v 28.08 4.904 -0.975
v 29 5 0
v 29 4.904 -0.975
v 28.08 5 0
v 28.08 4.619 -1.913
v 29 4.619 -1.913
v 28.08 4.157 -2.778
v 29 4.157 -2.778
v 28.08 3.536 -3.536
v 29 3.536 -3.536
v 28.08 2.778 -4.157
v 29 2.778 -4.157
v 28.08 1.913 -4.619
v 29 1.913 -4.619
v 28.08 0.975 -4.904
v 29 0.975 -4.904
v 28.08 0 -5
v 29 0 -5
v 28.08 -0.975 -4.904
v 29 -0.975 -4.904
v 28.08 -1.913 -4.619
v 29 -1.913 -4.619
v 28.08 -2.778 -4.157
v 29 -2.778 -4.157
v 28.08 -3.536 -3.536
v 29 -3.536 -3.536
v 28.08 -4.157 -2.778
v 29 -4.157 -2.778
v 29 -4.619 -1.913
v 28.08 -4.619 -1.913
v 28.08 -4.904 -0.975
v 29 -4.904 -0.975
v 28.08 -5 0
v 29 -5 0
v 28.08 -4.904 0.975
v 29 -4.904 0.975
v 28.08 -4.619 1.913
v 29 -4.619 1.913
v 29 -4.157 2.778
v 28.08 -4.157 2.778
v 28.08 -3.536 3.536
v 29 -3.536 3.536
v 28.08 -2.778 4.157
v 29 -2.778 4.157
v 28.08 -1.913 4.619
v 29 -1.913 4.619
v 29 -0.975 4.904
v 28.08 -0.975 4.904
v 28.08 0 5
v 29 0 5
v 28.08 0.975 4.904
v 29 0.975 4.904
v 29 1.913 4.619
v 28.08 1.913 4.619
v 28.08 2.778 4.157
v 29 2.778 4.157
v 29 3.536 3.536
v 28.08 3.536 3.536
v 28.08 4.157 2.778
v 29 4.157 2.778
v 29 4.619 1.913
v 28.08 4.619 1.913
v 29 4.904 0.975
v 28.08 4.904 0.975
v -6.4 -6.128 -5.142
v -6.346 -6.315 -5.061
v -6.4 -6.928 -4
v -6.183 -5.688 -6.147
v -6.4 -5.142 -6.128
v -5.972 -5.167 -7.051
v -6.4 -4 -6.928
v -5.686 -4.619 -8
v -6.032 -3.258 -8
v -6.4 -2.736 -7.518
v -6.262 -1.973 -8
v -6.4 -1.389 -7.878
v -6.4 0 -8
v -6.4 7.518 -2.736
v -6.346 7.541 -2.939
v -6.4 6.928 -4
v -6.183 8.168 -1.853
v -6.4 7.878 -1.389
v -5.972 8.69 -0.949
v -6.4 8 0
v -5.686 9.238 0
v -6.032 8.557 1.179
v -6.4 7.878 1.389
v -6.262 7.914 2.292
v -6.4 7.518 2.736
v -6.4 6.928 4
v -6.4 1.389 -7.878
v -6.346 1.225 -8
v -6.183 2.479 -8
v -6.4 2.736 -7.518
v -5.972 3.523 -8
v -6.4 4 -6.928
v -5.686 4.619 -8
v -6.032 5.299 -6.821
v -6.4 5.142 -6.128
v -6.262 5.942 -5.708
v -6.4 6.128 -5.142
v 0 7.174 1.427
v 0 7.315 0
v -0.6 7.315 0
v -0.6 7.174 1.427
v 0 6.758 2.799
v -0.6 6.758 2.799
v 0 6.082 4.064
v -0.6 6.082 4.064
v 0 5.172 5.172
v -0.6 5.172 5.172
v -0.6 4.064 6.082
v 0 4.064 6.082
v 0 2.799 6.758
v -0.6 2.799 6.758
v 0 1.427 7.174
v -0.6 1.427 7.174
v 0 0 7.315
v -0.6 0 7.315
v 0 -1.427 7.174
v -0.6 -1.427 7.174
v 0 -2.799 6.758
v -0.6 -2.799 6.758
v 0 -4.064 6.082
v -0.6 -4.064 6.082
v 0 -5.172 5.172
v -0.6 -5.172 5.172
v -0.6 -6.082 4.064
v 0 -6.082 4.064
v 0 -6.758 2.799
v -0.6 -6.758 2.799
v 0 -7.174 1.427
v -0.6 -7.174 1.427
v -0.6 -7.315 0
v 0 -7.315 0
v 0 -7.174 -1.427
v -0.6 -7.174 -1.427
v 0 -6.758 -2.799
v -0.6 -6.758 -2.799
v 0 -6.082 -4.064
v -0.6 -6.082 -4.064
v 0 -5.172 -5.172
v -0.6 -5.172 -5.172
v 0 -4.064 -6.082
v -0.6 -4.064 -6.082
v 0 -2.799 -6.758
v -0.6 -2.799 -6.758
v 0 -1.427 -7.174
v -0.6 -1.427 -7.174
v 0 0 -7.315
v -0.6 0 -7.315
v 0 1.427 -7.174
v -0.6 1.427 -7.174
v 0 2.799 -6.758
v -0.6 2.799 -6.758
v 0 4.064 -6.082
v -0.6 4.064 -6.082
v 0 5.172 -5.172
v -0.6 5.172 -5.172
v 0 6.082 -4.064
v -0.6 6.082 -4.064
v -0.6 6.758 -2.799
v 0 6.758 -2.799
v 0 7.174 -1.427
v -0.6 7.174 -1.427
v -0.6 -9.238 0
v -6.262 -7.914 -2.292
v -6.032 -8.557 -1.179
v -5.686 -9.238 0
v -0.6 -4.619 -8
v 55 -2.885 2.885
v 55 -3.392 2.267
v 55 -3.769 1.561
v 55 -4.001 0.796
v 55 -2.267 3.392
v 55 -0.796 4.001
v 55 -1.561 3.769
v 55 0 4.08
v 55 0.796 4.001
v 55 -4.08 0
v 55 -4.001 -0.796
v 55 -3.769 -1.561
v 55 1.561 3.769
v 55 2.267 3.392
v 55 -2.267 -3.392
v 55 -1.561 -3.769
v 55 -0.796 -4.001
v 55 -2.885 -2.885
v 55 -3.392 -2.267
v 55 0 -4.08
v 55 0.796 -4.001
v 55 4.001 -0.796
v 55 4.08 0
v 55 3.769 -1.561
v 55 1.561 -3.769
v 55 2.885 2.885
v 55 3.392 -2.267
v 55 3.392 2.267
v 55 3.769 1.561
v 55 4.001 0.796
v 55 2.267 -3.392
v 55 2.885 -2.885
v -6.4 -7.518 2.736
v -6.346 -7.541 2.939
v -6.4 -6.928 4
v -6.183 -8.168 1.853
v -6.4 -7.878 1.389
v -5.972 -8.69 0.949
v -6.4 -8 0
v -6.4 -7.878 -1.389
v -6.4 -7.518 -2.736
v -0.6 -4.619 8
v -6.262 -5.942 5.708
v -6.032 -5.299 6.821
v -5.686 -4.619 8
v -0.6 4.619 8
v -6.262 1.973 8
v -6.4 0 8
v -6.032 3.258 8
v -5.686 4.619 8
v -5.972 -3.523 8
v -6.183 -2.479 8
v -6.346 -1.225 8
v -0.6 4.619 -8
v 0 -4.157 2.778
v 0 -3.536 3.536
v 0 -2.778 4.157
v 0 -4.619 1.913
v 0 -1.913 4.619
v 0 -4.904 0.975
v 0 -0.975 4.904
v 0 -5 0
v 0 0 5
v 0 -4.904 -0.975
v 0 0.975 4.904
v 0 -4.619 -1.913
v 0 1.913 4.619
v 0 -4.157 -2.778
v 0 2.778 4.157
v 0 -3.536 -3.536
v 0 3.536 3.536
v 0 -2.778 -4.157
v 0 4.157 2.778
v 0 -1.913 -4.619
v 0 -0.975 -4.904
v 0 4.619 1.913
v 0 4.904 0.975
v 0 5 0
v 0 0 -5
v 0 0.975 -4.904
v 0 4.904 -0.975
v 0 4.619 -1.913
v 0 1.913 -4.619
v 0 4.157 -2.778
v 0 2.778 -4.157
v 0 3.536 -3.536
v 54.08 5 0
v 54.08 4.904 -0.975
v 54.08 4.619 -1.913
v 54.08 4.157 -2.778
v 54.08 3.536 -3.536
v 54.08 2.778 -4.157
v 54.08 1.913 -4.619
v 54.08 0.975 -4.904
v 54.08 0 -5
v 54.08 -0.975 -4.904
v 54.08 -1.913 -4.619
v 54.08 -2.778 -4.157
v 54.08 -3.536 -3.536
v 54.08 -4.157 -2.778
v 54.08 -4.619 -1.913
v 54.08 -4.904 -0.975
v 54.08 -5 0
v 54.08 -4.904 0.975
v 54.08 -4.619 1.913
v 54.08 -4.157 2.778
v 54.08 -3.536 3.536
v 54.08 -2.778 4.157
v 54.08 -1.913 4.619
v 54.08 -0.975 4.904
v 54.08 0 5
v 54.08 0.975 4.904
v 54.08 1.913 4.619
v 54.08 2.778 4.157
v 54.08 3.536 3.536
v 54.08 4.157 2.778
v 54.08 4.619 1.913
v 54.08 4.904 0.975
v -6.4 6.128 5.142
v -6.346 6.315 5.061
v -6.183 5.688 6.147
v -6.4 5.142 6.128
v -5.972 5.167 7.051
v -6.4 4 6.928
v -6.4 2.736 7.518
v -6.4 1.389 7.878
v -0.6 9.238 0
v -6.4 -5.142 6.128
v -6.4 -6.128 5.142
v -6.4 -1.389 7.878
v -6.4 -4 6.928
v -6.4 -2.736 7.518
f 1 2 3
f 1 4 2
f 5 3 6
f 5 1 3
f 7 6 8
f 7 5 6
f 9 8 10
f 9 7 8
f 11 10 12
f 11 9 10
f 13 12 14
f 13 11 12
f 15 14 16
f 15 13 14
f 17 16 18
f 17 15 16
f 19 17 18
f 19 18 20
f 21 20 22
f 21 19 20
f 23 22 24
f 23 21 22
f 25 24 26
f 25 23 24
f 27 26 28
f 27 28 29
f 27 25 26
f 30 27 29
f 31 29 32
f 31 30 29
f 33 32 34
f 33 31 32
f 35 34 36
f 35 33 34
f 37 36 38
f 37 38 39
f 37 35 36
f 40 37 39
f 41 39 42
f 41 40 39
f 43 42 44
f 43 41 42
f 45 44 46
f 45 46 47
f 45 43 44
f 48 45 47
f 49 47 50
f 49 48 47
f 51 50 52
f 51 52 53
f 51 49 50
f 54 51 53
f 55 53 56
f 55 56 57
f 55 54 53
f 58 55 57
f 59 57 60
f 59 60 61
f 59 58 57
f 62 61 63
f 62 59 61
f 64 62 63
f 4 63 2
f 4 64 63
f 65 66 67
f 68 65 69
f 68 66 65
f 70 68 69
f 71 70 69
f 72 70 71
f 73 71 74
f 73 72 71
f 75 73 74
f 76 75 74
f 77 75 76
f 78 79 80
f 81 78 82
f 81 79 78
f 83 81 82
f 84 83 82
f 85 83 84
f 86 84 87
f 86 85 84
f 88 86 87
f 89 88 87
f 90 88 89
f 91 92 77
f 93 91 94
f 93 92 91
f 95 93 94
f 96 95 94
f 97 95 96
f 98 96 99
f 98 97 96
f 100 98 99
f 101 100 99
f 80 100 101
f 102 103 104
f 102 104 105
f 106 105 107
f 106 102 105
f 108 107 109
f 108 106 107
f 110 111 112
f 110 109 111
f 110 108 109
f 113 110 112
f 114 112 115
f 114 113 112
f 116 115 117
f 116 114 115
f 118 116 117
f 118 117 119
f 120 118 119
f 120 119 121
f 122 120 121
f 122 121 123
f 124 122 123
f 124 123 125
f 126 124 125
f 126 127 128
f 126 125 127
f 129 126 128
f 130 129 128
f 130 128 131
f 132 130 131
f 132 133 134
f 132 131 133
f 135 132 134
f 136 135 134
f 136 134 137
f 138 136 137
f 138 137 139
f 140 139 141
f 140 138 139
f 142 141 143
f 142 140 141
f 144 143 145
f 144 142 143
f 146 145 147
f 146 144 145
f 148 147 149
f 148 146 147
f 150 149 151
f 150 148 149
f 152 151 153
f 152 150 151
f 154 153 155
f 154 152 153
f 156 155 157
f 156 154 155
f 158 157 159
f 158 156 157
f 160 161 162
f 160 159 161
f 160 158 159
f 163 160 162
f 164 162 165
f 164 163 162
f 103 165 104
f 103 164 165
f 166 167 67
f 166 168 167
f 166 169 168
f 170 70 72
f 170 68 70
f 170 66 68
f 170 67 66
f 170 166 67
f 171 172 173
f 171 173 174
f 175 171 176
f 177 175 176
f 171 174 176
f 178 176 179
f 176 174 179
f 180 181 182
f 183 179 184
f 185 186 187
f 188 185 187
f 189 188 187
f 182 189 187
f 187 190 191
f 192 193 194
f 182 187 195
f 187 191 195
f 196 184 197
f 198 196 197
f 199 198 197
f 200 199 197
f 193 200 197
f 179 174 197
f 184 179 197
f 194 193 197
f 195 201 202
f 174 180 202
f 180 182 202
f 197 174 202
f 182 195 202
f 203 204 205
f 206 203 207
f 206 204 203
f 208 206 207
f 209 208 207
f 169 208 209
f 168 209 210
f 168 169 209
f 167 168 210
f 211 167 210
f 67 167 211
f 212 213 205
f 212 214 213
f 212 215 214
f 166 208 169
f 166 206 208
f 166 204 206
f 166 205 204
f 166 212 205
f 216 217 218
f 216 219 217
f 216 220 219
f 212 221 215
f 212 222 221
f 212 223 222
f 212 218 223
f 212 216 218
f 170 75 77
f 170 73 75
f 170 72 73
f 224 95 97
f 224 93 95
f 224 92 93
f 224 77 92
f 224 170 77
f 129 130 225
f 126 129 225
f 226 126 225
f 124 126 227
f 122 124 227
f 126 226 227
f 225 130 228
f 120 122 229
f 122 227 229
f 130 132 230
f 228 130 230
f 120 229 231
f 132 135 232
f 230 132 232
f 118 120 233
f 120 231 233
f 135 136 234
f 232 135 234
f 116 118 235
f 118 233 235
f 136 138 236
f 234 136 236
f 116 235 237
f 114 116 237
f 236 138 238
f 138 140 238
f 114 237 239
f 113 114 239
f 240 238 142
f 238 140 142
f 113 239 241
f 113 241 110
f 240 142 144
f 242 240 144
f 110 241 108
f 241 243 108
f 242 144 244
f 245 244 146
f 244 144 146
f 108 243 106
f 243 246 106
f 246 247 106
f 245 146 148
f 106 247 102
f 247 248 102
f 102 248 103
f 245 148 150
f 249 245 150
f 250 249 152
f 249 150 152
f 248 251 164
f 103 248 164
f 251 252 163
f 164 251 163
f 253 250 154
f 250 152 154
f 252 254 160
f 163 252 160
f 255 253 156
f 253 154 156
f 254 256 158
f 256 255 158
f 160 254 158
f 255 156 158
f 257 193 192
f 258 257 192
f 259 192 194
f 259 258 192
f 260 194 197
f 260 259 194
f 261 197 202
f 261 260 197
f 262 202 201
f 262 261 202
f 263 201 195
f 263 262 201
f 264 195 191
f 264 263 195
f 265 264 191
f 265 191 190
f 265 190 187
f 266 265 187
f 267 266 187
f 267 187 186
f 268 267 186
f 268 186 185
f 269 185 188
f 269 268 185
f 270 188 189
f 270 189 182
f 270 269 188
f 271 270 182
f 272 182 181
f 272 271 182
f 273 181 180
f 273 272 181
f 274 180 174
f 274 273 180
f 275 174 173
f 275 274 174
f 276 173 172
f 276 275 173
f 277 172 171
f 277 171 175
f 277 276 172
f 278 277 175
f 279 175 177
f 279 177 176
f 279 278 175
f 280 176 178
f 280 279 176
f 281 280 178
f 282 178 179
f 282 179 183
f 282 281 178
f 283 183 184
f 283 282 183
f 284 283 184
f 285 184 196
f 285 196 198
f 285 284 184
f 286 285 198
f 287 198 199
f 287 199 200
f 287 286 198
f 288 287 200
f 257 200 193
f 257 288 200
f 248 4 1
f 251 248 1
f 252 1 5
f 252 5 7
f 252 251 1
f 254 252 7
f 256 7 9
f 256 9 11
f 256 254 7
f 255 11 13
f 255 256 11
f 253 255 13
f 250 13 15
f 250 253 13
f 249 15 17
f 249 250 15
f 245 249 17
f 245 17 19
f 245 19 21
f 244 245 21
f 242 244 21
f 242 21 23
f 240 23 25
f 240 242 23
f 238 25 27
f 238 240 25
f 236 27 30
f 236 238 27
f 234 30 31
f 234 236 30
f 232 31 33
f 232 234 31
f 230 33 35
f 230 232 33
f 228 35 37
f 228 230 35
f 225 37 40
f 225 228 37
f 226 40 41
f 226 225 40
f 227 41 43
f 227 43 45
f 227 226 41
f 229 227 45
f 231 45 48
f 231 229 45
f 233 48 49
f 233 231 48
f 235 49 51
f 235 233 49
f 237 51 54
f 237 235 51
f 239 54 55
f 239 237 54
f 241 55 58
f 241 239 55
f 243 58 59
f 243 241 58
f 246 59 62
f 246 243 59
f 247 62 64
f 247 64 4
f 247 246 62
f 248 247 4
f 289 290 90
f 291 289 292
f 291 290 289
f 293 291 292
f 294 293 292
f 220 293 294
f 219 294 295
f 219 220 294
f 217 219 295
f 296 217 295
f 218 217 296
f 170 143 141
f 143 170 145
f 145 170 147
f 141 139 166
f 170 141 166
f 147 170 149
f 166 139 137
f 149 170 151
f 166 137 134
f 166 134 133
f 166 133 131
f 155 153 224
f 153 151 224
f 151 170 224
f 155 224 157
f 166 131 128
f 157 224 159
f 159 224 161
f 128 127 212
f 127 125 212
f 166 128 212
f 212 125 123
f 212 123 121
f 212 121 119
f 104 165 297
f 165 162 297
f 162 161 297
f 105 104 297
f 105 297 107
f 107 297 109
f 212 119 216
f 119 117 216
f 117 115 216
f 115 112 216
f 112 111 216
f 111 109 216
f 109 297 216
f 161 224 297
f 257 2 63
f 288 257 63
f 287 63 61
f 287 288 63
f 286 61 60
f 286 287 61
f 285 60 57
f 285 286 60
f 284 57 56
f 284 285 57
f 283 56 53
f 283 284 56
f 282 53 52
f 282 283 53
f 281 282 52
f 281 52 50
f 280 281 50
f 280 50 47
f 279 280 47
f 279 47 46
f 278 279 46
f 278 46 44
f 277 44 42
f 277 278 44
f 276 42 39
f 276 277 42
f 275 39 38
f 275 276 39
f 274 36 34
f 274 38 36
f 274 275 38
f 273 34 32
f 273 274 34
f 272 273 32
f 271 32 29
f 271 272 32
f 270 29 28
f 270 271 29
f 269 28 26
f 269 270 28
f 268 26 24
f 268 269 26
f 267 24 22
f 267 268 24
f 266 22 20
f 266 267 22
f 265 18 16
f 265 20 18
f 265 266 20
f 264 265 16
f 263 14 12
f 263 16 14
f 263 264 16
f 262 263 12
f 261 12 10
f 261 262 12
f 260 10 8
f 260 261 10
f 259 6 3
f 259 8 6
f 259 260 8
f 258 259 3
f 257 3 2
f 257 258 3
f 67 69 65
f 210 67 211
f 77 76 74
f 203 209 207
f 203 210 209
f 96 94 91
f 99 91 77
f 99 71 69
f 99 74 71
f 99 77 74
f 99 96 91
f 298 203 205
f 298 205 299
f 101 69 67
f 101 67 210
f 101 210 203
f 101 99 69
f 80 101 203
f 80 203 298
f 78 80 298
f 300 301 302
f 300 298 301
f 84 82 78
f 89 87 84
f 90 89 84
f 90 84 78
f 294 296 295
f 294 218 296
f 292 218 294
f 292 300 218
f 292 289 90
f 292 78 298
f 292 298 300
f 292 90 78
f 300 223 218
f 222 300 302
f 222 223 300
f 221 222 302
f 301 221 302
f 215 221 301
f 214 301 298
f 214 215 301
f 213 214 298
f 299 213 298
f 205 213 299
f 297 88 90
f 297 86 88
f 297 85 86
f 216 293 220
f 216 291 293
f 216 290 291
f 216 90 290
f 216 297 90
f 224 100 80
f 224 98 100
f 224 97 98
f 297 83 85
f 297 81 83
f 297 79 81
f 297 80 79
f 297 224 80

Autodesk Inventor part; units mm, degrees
ref_plane "YZ Plane" through (0, 0, 0) normal (1, 0, 0) x (0, 1, 0)
ref_plane "XZ Plane" through (0, 0, 0) normal (0, 1, 0) x (-1, 0, 0)
sketch "Skizze1" plane through (0, 0, 0) normal (0, 0, 1) x (1, 0, 0)
  line L0 (0, 7.315) -> (0, 5)
  line L1 (29, 5) -> (55, 5)
  line L2 (55, 5) -> (55, 0)
  line L3 (55, 0) -> (-0.6001, 0)
  line L4 (-11.7201, 0) -> (66.12, 0) projected
  line L5 (-0.6001, 0) -> (-0.6001, 7.315)
  line L6 (-0.6001, 7.315) -> (0, 7.315)
  line L7 (29, 5) -> (28.0797, 5)
  line L8 (28.0797, 5) -> (0, 5)
  line L9 (0, -1.463) -> (0, 8.778) projected
  dimension "d0" = 55
  dimension "d1" = 26
  dimension "d2" = 10
  dimension "d9" = 0.6001
  dimension "d10" = 14.63
  dimension "d13" = 0.9203
  dimension "d14" = 10
revolve "Körper" add sketch "Skizze1" angle 360 about axis through (55, 0, 0) along (-1, 0, 0)
sketch "Skizze2" plane through (-0.6001, 0, 0) normal (-1, 0, 0) x (0, 0, 1)
  line L0 (0, 9.2376) -> (8, 4.6188)
  line L1 (8, 4.6188) -> (8, -4.6188)
  line L2 (8, -4.6188) -> (0, -9.2376)
  line L3 (0, -9.2376) -> (-8, -4.6188)
  line L4 (-8, -4.6188) -> (-8, 4.6188)
  line L5 (-8, 4.6188) -> (0, 9.2376)
  point P0 (0, 0)
  point P1 (0, 0)
  dimension "d11" = 16
extrude "Kopf" add sketch "Skizze2" along normal blind 5.8
sketch "Skizze4" plane through (0, 0, 0) normal (0, 0, 1) x (1, 0, 0)
  line L0 (-6.4001, 8) -> (-6.4001, 9.2376)
  line L1 (-6.4001, 9.2376) -> (-5.6856, 9.2376)
  line L2 (-5.6856, 9.2376) -> (-6.4001, 8)
  line L3 (-7.5601, 0) -> (0.5599, 0) projected
  line L4 (-0.6001, 9.2376) -> (-6.4001, 9.2376) projected
  line L5 (-6.4001, 4.6188) -> (-6.4001, 9.2376) projected
  dimension "d5" = 30
  dimension "d19" = 16
revolve "Fase1" cut sketch "Skizze4" angle 360 about axis through (-10, 0, 0) along (1, 0, 0)
thread "Gewinde" size "M10x1.5" class "6g" standard "ISO Metric profile" length 26
chamfer "Fase2" distance 0.9202 distance2 0.9203 1 edges at (55, -5, 0) measured on face at (55, 1.2281, 0.495)
ref_plane "Work Plane1" through (1.525, 0, 0) normal (0, 0, 1) x (1, 0, 0)
equation "\"d0\" = NLG"
equation "\"d1\" = GEL"
equation "\"d2\" = GD"
equation "\"d10\" = SD2"
equation "\"d14\" = BDM"
equation "\"d11\" = SW"
equation "\"d3\" = KOH - SD"
equation "\"d5\" = ANG1"
equation "\"d19\" = SW0"
equation "\"d15\" = GEL"
equation "\"d6\" = -0.5 * SPD + 0.5 * GD"
equation "\"NLG\" = 55"
equation "\"GD\" = NND"
equation "\"BDM\" = NND"
equation "\"KOH\" = 6.4"
equation "\"GEL\" = 26"
equation "\"SW\" = 16"
equation "\"SW0\" = SW"
equation "\"SPD\" = NND - 1.2269 * PTC"
equation "\"SD2\" = 14.63"
equation "\"SD\" = 0.6"
equation "\"ANG1\" = 30deg"
equation "\"GAL\" = 0.61345 * PTC"
equation "\"GUL\" = 0.61345 * PTC"
equation "\"RR\" = 0.4"
equation "\"GD1\" = THREADDIA - 1.2269 * PTC"
equation "\"SDH\" = SD2"
equation "\"TOA\" = 30deg"
equation "\"PTC\" = 1.5"
equation "\"E0\" = 1.155 * SW"
equation "\"NND\" = 10"
equation "\"THREADDIA\" = 10"
properties part number "ISO 4014 - M10 x 55" material "Edelstahl, 440C"
